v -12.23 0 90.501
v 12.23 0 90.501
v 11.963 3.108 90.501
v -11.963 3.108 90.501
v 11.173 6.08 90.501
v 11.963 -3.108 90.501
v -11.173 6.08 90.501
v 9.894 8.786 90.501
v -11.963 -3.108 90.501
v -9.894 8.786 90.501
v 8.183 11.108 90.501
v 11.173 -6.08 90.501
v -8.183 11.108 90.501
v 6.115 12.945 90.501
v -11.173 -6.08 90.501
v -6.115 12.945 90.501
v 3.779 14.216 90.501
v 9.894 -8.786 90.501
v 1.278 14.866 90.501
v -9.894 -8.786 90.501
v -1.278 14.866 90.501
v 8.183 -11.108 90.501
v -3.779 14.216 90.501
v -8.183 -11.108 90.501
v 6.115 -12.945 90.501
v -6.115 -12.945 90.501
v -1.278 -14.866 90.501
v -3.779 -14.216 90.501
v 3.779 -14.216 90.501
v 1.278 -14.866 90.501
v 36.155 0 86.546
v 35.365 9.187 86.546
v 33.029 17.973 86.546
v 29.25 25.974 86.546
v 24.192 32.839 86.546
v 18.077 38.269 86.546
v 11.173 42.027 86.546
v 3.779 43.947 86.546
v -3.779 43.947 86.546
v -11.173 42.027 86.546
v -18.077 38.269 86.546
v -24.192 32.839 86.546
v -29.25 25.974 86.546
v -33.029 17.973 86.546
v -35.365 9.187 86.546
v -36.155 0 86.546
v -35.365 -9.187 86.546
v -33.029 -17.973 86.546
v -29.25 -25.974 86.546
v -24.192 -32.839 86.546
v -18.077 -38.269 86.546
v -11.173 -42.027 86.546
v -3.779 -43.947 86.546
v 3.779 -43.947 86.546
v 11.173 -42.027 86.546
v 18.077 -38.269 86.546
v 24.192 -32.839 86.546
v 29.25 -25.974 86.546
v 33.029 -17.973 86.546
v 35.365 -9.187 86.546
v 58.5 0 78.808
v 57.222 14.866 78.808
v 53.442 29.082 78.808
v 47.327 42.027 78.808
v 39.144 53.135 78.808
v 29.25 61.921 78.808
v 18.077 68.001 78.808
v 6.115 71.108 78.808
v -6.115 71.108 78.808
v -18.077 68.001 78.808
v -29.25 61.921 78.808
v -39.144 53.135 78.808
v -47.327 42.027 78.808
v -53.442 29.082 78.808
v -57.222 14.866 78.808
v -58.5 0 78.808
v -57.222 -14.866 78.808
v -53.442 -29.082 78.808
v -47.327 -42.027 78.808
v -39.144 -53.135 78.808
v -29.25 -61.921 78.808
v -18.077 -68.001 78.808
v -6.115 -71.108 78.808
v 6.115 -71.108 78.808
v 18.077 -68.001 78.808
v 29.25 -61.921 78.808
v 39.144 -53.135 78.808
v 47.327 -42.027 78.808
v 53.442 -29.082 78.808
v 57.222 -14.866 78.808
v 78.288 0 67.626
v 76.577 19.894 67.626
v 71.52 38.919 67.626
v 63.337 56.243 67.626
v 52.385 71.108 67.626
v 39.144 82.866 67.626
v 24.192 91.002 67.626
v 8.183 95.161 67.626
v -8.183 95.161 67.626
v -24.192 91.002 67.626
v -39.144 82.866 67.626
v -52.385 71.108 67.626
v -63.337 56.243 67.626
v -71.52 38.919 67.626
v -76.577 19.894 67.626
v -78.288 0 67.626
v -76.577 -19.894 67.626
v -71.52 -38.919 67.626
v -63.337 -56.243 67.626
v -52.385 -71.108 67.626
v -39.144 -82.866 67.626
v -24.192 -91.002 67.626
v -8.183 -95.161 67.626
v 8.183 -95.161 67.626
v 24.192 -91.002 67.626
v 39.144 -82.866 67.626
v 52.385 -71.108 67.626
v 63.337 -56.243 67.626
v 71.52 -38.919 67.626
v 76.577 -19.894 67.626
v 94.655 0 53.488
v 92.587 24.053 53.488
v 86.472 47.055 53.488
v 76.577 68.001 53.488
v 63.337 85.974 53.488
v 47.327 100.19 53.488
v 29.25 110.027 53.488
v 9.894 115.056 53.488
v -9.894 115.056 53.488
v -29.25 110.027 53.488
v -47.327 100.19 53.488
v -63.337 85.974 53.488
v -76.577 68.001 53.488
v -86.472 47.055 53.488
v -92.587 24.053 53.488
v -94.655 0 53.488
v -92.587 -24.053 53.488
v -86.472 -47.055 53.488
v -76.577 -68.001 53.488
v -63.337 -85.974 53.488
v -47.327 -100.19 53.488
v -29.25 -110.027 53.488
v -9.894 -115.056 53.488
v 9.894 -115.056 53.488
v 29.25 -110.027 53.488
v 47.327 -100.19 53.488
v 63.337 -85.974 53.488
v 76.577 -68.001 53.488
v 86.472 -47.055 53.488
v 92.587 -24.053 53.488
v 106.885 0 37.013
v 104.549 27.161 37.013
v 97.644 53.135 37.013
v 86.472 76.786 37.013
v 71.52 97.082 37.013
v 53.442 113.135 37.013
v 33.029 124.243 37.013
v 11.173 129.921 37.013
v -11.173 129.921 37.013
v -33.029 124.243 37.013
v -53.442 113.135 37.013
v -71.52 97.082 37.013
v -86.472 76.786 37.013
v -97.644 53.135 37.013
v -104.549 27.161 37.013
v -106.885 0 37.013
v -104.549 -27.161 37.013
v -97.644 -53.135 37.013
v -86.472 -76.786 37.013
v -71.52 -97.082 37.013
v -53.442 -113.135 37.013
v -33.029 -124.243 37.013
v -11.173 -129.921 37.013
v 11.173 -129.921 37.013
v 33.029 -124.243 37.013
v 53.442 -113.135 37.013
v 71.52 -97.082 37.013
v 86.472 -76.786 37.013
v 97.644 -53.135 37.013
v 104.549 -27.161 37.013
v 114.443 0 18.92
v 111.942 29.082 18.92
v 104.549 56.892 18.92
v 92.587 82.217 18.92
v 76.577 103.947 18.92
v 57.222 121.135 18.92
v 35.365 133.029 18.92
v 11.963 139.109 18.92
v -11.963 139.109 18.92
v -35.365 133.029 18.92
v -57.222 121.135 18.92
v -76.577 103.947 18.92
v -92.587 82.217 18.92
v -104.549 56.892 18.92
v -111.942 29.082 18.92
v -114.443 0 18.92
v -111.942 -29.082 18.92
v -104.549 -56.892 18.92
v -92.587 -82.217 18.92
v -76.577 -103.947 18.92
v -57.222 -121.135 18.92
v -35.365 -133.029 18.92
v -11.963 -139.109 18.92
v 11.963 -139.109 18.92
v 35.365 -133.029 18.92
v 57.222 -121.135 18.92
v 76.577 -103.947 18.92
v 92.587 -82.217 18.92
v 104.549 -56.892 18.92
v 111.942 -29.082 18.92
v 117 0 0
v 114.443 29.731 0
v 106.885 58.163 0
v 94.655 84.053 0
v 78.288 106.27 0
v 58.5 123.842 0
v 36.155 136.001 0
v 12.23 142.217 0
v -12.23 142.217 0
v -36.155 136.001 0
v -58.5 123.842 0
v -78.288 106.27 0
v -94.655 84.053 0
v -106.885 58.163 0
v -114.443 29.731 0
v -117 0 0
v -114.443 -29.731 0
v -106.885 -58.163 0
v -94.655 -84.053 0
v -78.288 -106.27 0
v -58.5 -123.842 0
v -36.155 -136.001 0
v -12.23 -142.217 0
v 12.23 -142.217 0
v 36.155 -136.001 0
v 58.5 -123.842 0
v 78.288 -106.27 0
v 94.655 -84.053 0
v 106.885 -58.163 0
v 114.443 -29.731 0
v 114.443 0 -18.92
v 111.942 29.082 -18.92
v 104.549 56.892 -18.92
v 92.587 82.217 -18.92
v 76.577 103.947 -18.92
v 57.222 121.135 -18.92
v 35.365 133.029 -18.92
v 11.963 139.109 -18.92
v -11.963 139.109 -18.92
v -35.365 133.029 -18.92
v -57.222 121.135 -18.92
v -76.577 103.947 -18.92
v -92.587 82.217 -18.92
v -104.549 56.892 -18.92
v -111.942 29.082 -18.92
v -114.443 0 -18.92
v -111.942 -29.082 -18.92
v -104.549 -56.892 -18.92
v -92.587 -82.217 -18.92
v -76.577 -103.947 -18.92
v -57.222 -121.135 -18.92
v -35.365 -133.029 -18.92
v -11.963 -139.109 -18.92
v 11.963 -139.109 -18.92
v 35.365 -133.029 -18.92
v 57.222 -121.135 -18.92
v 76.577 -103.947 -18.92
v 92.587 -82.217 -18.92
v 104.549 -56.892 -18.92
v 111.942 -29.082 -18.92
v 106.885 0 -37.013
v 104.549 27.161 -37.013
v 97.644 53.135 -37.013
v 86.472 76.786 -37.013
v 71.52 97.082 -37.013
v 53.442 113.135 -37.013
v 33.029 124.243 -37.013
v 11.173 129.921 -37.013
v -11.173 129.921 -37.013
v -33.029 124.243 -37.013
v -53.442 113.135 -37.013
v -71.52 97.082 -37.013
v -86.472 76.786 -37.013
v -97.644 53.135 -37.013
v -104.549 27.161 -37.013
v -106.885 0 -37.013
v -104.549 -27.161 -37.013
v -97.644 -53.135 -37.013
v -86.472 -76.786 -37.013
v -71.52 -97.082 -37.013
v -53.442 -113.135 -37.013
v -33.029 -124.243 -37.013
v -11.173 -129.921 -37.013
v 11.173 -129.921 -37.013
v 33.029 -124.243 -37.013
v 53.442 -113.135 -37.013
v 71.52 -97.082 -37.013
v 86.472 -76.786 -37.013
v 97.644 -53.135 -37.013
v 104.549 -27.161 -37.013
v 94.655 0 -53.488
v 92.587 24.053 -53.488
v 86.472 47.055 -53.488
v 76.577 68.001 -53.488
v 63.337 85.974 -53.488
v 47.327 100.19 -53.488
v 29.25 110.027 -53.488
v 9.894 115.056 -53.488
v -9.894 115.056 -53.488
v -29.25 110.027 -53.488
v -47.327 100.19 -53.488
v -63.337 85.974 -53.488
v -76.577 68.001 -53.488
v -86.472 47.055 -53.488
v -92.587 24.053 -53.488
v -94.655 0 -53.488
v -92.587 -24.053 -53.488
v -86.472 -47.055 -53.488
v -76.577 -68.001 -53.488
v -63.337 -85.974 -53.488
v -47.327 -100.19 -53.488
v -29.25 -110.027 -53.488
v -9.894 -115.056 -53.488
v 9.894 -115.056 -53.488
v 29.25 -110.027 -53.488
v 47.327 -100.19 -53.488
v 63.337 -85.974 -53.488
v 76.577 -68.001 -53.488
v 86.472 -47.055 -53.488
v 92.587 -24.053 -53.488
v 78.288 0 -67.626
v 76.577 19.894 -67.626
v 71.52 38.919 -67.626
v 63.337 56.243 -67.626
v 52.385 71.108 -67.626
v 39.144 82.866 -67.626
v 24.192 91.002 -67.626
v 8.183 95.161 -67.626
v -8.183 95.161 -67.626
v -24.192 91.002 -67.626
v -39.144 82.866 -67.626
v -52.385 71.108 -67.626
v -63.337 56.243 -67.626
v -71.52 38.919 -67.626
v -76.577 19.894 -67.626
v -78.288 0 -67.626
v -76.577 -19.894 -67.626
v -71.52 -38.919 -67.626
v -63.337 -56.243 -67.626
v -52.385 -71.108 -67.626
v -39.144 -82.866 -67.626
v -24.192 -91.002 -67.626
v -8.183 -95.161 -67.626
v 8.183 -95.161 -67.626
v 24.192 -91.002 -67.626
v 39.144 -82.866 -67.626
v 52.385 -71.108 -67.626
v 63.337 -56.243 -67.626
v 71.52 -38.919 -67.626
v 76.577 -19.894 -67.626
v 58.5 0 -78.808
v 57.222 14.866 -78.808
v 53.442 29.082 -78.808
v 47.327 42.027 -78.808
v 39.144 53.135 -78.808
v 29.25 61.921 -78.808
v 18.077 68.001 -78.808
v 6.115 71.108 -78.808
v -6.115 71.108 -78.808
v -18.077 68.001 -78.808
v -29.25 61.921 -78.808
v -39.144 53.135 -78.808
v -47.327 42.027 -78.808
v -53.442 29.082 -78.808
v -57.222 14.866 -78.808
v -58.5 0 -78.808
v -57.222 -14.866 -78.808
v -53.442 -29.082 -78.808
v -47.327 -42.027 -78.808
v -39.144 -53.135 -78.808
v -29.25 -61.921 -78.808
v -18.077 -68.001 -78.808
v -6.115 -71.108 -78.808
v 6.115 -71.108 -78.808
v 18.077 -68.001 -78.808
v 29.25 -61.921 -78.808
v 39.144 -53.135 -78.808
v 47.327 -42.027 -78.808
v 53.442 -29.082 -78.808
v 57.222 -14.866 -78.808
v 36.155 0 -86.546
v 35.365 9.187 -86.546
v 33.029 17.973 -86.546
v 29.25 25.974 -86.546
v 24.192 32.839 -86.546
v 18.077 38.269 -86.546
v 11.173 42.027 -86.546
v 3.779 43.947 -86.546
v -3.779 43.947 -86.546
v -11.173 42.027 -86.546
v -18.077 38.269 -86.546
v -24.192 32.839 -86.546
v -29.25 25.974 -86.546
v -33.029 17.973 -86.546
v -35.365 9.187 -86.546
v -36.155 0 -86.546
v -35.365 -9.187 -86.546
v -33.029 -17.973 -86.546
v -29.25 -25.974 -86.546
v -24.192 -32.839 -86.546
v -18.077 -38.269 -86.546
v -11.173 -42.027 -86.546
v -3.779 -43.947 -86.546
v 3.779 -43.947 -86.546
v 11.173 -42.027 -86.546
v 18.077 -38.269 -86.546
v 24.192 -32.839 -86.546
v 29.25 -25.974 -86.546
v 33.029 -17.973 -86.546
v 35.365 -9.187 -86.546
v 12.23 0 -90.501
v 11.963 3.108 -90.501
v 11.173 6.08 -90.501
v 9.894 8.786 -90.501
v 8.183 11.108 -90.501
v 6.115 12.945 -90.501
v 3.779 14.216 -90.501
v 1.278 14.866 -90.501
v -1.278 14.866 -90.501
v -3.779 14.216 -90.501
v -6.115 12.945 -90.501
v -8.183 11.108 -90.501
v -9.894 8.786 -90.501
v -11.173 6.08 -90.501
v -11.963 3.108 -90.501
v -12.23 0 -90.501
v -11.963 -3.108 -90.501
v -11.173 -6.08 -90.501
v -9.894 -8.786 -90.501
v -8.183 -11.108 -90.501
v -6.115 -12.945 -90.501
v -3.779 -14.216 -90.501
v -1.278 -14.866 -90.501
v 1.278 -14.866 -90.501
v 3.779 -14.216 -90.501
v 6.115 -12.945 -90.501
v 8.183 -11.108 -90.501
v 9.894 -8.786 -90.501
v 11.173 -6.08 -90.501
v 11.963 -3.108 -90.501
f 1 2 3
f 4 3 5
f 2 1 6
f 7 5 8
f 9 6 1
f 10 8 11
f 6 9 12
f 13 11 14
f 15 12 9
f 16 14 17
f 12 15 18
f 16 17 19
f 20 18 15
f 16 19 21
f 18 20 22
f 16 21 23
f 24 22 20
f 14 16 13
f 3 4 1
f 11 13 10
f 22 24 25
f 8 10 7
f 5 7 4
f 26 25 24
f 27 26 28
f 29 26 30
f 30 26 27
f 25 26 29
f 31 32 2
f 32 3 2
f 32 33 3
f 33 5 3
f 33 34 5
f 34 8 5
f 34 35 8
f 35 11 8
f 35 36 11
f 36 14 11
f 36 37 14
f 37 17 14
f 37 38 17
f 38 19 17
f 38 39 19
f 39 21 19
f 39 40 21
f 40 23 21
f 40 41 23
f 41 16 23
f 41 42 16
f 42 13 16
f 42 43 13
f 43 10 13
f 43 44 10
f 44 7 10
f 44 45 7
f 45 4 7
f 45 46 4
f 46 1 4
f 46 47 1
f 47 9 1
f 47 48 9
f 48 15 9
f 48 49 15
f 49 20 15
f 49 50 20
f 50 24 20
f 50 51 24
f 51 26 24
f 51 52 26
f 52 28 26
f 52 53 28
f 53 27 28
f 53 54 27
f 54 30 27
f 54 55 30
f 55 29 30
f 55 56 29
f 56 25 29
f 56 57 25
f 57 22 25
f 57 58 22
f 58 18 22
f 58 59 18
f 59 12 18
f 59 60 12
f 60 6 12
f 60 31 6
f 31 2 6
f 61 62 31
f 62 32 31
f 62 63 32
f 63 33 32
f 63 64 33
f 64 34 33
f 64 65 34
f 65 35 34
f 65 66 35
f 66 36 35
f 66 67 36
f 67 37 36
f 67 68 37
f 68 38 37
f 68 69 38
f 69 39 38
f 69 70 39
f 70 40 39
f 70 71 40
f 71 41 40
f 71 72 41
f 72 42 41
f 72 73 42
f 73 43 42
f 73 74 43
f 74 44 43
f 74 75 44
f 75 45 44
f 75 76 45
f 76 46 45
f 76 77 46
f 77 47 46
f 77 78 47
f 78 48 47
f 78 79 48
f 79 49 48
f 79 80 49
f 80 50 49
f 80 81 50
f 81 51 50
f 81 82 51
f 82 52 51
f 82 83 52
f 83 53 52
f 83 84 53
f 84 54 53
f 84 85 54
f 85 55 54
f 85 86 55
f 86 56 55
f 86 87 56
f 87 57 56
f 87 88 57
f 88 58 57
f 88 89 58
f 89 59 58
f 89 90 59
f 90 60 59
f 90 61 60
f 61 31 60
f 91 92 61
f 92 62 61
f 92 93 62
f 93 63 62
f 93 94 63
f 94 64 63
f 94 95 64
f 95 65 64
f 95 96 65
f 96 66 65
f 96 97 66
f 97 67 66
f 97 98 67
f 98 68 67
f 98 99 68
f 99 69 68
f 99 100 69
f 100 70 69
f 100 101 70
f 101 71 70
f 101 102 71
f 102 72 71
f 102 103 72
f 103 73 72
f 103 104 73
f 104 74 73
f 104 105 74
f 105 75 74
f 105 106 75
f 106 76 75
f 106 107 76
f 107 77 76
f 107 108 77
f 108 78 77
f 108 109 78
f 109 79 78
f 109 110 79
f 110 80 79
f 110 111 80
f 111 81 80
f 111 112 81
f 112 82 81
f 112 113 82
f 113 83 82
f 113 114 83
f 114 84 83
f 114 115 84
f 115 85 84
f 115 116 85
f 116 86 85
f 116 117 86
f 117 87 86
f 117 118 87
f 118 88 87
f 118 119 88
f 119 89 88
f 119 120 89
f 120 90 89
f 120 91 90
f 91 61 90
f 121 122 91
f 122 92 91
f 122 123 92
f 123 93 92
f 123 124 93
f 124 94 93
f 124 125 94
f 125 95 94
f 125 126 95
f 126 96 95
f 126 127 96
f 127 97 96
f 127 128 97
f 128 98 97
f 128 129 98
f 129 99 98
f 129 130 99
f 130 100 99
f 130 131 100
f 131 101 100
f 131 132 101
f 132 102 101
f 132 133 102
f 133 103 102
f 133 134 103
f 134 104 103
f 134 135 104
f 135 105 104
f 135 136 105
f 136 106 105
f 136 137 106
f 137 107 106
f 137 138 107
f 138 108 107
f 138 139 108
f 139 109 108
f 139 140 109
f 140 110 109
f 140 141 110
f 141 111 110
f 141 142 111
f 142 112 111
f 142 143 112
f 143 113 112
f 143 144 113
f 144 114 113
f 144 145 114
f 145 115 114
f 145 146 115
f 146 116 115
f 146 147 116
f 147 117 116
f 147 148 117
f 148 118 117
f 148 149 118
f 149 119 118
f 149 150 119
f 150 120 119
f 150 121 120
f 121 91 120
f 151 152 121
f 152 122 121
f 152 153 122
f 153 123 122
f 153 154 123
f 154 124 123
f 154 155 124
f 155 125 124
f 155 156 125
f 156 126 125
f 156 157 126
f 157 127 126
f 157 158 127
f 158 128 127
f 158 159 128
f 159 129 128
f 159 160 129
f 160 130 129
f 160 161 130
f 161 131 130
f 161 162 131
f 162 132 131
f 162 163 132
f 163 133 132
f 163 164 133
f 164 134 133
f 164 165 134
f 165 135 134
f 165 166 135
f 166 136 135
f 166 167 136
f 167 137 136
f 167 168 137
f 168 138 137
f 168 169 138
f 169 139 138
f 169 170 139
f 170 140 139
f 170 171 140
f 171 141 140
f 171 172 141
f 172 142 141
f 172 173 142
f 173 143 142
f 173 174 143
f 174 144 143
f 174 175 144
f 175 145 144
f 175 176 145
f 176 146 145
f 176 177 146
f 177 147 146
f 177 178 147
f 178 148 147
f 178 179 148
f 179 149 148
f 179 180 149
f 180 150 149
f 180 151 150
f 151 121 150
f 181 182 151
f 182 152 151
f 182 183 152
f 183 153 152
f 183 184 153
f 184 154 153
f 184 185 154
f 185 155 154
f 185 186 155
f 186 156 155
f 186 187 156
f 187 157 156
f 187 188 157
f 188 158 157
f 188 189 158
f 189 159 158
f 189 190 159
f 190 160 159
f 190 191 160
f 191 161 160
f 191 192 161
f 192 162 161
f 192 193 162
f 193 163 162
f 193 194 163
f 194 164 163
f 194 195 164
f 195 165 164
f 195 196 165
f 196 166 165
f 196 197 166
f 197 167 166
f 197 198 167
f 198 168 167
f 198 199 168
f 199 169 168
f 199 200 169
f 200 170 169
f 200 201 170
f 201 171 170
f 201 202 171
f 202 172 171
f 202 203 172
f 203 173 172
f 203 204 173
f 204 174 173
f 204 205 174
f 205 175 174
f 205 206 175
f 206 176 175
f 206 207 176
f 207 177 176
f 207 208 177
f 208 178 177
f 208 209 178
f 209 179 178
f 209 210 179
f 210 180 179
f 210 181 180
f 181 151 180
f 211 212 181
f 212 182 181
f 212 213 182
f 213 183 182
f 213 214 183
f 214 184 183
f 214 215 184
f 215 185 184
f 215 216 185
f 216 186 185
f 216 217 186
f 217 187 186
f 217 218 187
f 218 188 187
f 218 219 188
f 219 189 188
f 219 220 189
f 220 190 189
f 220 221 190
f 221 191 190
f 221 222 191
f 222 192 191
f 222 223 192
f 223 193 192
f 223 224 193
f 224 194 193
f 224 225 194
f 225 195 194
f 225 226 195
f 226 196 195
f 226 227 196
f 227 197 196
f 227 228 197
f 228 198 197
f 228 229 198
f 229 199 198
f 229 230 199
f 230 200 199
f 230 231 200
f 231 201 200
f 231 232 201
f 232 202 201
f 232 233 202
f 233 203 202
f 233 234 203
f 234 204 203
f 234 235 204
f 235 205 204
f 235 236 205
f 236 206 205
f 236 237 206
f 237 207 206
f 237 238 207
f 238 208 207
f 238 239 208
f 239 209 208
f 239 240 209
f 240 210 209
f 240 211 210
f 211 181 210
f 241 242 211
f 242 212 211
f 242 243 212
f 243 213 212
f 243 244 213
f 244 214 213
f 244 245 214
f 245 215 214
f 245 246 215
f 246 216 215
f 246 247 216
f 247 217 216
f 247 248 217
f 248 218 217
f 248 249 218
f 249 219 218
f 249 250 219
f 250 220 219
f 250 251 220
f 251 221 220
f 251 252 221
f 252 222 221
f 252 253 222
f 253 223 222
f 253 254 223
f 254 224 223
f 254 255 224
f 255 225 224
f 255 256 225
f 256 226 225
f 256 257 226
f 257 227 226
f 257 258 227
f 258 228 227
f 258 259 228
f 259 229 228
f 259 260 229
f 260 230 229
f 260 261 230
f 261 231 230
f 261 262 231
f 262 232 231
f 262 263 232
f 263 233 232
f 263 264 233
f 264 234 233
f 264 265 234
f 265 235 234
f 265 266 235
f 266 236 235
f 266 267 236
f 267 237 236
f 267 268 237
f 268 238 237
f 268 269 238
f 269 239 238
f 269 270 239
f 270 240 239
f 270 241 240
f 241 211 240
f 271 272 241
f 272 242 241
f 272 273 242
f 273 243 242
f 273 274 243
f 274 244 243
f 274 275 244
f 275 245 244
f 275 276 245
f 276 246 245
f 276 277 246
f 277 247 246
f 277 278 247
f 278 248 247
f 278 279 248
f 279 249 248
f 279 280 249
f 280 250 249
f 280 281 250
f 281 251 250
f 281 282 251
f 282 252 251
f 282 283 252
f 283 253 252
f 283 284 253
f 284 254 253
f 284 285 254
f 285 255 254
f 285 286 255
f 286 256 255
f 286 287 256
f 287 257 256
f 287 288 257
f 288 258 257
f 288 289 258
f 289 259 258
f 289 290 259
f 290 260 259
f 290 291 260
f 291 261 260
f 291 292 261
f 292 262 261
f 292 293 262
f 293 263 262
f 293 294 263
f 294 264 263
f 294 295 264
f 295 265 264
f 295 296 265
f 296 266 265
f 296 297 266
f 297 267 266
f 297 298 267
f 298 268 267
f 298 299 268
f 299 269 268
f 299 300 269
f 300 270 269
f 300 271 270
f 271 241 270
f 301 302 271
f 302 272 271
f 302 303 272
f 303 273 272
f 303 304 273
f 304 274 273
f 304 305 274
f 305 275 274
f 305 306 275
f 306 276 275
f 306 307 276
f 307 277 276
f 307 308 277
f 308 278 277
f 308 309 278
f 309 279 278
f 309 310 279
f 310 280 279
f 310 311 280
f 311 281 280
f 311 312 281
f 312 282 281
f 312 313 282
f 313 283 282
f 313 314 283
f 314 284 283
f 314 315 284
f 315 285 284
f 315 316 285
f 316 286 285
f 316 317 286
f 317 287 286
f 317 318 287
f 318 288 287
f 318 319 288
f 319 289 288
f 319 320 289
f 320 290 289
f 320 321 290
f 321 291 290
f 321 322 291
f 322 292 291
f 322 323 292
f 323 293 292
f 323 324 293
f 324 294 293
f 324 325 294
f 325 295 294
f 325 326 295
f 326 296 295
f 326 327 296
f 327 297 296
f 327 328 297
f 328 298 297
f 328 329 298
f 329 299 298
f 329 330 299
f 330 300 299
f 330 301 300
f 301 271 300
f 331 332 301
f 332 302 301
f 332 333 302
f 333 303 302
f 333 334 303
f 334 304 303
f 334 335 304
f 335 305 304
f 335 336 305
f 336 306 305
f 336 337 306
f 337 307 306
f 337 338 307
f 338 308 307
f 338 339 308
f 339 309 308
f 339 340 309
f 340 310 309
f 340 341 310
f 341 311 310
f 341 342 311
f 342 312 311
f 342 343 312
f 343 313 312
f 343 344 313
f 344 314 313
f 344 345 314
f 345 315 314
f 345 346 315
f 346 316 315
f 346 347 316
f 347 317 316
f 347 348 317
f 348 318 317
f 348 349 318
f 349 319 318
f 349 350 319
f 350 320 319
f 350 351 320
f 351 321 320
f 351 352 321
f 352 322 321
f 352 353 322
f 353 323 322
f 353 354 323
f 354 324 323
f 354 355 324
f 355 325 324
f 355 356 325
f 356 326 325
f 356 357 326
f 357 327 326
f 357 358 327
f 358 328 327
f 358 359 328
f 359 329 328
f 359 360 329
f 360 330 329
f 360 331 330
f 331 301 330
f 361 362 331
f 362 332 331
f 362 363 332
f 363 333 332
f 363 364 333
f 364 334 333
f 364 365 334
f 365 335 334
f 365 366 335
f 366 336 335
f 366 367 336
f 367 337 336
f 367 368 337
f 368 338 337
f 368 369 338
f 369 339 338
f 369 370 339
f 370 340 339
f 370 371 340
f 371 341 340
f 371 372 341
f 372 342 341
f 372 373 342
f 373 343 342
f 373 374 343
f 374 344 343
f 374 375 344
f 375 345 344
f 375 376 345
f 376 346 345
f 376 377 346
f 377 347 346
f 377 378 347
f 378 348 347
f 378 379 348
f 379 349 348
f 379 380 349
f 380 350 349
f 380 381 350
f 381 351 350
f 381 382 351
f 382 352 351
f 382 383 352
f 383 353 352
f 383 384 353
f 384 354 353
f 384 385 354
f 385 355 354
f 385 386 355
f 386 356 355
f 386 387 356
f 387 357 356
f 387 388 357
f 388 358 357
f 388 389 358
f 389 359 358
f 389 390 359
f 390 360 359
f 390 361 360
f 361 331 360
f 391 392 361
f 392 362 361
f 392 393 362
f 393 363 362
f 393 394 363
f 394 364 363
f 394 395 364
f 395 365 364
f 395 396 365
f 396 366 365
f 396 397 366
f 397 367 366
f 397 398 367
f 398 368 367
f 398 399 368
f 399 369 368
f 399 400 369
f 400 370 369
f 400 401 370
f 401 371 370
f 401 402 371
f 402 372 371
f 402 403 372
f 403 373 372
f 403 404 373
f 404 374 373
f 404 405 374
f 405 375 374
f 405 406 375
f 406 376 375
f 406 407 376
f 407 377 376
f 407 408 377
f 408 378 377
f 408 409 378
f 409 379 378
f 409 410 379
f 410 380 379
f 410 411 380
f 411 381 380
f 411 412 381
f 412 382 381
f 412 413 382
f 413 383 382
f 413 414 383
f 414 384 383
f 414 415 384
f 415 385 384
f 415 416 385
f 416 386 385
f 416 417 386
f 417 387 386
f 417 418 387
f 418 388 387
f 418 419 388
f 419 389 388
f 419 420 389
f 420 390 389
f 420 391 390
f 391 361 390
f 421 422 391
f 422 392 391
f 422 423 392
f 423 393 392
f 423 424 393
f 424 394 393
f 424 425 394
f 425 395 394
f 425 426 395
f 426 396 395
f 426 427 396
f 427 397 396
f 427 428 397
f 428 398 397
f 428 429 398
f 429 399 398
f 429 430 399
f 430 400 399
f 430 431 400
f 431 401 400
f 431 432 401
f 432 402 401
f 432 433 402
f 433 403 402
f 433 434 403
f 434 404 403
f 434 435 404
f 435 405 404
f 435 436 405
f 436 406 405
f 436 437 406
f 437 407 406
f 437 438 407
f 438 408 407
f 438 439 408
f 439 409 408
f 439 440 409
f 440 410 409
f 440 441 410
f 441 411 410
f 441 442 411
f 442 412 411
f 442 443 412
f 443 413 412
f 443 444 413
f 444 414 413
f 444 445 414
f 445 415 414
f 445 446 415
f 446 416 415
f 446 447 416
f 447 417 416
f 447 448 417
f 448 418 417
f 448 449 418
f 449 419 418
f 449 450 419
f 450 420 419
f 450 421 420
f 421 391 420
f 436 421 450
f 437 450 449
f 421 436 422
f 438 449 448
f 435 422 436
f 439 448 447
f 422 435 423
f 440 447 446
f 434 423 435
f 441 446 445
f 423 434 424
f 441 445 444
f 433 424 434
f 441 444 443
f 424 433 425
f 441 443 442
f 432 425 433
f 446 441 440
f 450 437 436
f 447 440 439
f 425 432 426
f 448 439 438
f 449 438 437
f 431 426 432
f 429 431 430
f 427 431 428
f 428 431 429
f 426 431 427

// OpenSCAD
// Generated by SolidPython 1.0.1 on 2020-07-29 00:46:48


scale(v = [9, 11, 7]) {
	sphere(r = 13);
}
/***********************************************
*********      SolidPython code:      **********
************************************************
 
# import packages: SolidPython
from solid import *
from solid.utils import *
from itertools import chain, combinations, permutations


class Resize:

    def __init__(self, scad_file):
        self.scad_file = scad_file
        #self.scad_file = import_scad(scad_file)
        # cone/cylinder param:
        self.r1 = 0
        self.r2 = 0
        self.h = 0
        # rectangular prism param:
        self.w = 0
        self.l = 0
        # ellipse param:
        self.r = 0

    # import OpenScad code (file name corresponds to shape)


    # classify shape + parameters
    def assign(self, param1, param2, param3):
        if self.scad_file == 'cone.scad':
            self.r1 = param1
            self.r2 = param2
            self.h = param3
        elif self.scad_file == 'cylinder.scad':
            self.r1 = param1
            self.r2 = param2
            self.h = param3
        elif self.scad_file == 'rectangularPrism.scad':
            self.h = param1
            self.l = param2
            self.w = param3
        else:
            self.r = param1
            self.h = param2

    # resize parameters
    def iterate(self):
        x = range(3, 20, 2)
        i = 1
        if self.scad_file == 'cone.scad':
            tempList = list(permutations(x, 2))
            for temp in tempList:
                param1 = temp[0]
                param2 = temp[1]
                filepath = 'produced_scad_files/' + 'cone' + str(param1) + '_' + str(param2) + '_' + '.scad'
                scad_render_to_file(cylinder(h=param1, r1=param2, r2=0), filepath)

        elif self.scad_file == 'cylinder.scad':
            tempList = list(permutations(x, 3))
            for temp in tempList:
                param1 = temp[0]
                param2 = temp[1]
                filepath = 'produced_scad_files/' + 'cylinder' + str(param1) + '_' + str(param2) + '_' + '.scad'
                scad_render_to_file(cylinder(h=param1, r1=param2, r2=param2), filepath)

        elif self.scad_file == 'rectangularPrism.scad':
            tempList = list(permutations(x, 3))
            for temp in tempList:
                param1 = temp[0]
                param2 = temp[1]
                param3 = temp[2]
                filepath = 'produced_scad_files/' + 'rectangularPrism' + str(param1) + '_' + str(param2) + '_' + str(
                    param3) + '.scad'
                scad_render_to_file(cube(size=(param1, param2, param3)), filepath)

        elif self.scad_file == 'ellipse.scad':
            tempList = list(permutations(x, 4))
            for temp in tempList:
                param1 = temp[0]
                param2 = temp[1]
                param3 = temp[2]
                param4 = temp[3]
                filepath = 'produced_scad_files/' + 'ellipse' + str(param1) + '_' + str(param2) + '_' + str(param3) + '_' + str(param4) + '.scad'
                scad_render_to_file(scale([param1, param2, param3])(sphere(r=param4)), filepath)

    def render_to_scadfile(self):
        scad_render_to_file(scad, 'example.scad') 
 
************************************************/
